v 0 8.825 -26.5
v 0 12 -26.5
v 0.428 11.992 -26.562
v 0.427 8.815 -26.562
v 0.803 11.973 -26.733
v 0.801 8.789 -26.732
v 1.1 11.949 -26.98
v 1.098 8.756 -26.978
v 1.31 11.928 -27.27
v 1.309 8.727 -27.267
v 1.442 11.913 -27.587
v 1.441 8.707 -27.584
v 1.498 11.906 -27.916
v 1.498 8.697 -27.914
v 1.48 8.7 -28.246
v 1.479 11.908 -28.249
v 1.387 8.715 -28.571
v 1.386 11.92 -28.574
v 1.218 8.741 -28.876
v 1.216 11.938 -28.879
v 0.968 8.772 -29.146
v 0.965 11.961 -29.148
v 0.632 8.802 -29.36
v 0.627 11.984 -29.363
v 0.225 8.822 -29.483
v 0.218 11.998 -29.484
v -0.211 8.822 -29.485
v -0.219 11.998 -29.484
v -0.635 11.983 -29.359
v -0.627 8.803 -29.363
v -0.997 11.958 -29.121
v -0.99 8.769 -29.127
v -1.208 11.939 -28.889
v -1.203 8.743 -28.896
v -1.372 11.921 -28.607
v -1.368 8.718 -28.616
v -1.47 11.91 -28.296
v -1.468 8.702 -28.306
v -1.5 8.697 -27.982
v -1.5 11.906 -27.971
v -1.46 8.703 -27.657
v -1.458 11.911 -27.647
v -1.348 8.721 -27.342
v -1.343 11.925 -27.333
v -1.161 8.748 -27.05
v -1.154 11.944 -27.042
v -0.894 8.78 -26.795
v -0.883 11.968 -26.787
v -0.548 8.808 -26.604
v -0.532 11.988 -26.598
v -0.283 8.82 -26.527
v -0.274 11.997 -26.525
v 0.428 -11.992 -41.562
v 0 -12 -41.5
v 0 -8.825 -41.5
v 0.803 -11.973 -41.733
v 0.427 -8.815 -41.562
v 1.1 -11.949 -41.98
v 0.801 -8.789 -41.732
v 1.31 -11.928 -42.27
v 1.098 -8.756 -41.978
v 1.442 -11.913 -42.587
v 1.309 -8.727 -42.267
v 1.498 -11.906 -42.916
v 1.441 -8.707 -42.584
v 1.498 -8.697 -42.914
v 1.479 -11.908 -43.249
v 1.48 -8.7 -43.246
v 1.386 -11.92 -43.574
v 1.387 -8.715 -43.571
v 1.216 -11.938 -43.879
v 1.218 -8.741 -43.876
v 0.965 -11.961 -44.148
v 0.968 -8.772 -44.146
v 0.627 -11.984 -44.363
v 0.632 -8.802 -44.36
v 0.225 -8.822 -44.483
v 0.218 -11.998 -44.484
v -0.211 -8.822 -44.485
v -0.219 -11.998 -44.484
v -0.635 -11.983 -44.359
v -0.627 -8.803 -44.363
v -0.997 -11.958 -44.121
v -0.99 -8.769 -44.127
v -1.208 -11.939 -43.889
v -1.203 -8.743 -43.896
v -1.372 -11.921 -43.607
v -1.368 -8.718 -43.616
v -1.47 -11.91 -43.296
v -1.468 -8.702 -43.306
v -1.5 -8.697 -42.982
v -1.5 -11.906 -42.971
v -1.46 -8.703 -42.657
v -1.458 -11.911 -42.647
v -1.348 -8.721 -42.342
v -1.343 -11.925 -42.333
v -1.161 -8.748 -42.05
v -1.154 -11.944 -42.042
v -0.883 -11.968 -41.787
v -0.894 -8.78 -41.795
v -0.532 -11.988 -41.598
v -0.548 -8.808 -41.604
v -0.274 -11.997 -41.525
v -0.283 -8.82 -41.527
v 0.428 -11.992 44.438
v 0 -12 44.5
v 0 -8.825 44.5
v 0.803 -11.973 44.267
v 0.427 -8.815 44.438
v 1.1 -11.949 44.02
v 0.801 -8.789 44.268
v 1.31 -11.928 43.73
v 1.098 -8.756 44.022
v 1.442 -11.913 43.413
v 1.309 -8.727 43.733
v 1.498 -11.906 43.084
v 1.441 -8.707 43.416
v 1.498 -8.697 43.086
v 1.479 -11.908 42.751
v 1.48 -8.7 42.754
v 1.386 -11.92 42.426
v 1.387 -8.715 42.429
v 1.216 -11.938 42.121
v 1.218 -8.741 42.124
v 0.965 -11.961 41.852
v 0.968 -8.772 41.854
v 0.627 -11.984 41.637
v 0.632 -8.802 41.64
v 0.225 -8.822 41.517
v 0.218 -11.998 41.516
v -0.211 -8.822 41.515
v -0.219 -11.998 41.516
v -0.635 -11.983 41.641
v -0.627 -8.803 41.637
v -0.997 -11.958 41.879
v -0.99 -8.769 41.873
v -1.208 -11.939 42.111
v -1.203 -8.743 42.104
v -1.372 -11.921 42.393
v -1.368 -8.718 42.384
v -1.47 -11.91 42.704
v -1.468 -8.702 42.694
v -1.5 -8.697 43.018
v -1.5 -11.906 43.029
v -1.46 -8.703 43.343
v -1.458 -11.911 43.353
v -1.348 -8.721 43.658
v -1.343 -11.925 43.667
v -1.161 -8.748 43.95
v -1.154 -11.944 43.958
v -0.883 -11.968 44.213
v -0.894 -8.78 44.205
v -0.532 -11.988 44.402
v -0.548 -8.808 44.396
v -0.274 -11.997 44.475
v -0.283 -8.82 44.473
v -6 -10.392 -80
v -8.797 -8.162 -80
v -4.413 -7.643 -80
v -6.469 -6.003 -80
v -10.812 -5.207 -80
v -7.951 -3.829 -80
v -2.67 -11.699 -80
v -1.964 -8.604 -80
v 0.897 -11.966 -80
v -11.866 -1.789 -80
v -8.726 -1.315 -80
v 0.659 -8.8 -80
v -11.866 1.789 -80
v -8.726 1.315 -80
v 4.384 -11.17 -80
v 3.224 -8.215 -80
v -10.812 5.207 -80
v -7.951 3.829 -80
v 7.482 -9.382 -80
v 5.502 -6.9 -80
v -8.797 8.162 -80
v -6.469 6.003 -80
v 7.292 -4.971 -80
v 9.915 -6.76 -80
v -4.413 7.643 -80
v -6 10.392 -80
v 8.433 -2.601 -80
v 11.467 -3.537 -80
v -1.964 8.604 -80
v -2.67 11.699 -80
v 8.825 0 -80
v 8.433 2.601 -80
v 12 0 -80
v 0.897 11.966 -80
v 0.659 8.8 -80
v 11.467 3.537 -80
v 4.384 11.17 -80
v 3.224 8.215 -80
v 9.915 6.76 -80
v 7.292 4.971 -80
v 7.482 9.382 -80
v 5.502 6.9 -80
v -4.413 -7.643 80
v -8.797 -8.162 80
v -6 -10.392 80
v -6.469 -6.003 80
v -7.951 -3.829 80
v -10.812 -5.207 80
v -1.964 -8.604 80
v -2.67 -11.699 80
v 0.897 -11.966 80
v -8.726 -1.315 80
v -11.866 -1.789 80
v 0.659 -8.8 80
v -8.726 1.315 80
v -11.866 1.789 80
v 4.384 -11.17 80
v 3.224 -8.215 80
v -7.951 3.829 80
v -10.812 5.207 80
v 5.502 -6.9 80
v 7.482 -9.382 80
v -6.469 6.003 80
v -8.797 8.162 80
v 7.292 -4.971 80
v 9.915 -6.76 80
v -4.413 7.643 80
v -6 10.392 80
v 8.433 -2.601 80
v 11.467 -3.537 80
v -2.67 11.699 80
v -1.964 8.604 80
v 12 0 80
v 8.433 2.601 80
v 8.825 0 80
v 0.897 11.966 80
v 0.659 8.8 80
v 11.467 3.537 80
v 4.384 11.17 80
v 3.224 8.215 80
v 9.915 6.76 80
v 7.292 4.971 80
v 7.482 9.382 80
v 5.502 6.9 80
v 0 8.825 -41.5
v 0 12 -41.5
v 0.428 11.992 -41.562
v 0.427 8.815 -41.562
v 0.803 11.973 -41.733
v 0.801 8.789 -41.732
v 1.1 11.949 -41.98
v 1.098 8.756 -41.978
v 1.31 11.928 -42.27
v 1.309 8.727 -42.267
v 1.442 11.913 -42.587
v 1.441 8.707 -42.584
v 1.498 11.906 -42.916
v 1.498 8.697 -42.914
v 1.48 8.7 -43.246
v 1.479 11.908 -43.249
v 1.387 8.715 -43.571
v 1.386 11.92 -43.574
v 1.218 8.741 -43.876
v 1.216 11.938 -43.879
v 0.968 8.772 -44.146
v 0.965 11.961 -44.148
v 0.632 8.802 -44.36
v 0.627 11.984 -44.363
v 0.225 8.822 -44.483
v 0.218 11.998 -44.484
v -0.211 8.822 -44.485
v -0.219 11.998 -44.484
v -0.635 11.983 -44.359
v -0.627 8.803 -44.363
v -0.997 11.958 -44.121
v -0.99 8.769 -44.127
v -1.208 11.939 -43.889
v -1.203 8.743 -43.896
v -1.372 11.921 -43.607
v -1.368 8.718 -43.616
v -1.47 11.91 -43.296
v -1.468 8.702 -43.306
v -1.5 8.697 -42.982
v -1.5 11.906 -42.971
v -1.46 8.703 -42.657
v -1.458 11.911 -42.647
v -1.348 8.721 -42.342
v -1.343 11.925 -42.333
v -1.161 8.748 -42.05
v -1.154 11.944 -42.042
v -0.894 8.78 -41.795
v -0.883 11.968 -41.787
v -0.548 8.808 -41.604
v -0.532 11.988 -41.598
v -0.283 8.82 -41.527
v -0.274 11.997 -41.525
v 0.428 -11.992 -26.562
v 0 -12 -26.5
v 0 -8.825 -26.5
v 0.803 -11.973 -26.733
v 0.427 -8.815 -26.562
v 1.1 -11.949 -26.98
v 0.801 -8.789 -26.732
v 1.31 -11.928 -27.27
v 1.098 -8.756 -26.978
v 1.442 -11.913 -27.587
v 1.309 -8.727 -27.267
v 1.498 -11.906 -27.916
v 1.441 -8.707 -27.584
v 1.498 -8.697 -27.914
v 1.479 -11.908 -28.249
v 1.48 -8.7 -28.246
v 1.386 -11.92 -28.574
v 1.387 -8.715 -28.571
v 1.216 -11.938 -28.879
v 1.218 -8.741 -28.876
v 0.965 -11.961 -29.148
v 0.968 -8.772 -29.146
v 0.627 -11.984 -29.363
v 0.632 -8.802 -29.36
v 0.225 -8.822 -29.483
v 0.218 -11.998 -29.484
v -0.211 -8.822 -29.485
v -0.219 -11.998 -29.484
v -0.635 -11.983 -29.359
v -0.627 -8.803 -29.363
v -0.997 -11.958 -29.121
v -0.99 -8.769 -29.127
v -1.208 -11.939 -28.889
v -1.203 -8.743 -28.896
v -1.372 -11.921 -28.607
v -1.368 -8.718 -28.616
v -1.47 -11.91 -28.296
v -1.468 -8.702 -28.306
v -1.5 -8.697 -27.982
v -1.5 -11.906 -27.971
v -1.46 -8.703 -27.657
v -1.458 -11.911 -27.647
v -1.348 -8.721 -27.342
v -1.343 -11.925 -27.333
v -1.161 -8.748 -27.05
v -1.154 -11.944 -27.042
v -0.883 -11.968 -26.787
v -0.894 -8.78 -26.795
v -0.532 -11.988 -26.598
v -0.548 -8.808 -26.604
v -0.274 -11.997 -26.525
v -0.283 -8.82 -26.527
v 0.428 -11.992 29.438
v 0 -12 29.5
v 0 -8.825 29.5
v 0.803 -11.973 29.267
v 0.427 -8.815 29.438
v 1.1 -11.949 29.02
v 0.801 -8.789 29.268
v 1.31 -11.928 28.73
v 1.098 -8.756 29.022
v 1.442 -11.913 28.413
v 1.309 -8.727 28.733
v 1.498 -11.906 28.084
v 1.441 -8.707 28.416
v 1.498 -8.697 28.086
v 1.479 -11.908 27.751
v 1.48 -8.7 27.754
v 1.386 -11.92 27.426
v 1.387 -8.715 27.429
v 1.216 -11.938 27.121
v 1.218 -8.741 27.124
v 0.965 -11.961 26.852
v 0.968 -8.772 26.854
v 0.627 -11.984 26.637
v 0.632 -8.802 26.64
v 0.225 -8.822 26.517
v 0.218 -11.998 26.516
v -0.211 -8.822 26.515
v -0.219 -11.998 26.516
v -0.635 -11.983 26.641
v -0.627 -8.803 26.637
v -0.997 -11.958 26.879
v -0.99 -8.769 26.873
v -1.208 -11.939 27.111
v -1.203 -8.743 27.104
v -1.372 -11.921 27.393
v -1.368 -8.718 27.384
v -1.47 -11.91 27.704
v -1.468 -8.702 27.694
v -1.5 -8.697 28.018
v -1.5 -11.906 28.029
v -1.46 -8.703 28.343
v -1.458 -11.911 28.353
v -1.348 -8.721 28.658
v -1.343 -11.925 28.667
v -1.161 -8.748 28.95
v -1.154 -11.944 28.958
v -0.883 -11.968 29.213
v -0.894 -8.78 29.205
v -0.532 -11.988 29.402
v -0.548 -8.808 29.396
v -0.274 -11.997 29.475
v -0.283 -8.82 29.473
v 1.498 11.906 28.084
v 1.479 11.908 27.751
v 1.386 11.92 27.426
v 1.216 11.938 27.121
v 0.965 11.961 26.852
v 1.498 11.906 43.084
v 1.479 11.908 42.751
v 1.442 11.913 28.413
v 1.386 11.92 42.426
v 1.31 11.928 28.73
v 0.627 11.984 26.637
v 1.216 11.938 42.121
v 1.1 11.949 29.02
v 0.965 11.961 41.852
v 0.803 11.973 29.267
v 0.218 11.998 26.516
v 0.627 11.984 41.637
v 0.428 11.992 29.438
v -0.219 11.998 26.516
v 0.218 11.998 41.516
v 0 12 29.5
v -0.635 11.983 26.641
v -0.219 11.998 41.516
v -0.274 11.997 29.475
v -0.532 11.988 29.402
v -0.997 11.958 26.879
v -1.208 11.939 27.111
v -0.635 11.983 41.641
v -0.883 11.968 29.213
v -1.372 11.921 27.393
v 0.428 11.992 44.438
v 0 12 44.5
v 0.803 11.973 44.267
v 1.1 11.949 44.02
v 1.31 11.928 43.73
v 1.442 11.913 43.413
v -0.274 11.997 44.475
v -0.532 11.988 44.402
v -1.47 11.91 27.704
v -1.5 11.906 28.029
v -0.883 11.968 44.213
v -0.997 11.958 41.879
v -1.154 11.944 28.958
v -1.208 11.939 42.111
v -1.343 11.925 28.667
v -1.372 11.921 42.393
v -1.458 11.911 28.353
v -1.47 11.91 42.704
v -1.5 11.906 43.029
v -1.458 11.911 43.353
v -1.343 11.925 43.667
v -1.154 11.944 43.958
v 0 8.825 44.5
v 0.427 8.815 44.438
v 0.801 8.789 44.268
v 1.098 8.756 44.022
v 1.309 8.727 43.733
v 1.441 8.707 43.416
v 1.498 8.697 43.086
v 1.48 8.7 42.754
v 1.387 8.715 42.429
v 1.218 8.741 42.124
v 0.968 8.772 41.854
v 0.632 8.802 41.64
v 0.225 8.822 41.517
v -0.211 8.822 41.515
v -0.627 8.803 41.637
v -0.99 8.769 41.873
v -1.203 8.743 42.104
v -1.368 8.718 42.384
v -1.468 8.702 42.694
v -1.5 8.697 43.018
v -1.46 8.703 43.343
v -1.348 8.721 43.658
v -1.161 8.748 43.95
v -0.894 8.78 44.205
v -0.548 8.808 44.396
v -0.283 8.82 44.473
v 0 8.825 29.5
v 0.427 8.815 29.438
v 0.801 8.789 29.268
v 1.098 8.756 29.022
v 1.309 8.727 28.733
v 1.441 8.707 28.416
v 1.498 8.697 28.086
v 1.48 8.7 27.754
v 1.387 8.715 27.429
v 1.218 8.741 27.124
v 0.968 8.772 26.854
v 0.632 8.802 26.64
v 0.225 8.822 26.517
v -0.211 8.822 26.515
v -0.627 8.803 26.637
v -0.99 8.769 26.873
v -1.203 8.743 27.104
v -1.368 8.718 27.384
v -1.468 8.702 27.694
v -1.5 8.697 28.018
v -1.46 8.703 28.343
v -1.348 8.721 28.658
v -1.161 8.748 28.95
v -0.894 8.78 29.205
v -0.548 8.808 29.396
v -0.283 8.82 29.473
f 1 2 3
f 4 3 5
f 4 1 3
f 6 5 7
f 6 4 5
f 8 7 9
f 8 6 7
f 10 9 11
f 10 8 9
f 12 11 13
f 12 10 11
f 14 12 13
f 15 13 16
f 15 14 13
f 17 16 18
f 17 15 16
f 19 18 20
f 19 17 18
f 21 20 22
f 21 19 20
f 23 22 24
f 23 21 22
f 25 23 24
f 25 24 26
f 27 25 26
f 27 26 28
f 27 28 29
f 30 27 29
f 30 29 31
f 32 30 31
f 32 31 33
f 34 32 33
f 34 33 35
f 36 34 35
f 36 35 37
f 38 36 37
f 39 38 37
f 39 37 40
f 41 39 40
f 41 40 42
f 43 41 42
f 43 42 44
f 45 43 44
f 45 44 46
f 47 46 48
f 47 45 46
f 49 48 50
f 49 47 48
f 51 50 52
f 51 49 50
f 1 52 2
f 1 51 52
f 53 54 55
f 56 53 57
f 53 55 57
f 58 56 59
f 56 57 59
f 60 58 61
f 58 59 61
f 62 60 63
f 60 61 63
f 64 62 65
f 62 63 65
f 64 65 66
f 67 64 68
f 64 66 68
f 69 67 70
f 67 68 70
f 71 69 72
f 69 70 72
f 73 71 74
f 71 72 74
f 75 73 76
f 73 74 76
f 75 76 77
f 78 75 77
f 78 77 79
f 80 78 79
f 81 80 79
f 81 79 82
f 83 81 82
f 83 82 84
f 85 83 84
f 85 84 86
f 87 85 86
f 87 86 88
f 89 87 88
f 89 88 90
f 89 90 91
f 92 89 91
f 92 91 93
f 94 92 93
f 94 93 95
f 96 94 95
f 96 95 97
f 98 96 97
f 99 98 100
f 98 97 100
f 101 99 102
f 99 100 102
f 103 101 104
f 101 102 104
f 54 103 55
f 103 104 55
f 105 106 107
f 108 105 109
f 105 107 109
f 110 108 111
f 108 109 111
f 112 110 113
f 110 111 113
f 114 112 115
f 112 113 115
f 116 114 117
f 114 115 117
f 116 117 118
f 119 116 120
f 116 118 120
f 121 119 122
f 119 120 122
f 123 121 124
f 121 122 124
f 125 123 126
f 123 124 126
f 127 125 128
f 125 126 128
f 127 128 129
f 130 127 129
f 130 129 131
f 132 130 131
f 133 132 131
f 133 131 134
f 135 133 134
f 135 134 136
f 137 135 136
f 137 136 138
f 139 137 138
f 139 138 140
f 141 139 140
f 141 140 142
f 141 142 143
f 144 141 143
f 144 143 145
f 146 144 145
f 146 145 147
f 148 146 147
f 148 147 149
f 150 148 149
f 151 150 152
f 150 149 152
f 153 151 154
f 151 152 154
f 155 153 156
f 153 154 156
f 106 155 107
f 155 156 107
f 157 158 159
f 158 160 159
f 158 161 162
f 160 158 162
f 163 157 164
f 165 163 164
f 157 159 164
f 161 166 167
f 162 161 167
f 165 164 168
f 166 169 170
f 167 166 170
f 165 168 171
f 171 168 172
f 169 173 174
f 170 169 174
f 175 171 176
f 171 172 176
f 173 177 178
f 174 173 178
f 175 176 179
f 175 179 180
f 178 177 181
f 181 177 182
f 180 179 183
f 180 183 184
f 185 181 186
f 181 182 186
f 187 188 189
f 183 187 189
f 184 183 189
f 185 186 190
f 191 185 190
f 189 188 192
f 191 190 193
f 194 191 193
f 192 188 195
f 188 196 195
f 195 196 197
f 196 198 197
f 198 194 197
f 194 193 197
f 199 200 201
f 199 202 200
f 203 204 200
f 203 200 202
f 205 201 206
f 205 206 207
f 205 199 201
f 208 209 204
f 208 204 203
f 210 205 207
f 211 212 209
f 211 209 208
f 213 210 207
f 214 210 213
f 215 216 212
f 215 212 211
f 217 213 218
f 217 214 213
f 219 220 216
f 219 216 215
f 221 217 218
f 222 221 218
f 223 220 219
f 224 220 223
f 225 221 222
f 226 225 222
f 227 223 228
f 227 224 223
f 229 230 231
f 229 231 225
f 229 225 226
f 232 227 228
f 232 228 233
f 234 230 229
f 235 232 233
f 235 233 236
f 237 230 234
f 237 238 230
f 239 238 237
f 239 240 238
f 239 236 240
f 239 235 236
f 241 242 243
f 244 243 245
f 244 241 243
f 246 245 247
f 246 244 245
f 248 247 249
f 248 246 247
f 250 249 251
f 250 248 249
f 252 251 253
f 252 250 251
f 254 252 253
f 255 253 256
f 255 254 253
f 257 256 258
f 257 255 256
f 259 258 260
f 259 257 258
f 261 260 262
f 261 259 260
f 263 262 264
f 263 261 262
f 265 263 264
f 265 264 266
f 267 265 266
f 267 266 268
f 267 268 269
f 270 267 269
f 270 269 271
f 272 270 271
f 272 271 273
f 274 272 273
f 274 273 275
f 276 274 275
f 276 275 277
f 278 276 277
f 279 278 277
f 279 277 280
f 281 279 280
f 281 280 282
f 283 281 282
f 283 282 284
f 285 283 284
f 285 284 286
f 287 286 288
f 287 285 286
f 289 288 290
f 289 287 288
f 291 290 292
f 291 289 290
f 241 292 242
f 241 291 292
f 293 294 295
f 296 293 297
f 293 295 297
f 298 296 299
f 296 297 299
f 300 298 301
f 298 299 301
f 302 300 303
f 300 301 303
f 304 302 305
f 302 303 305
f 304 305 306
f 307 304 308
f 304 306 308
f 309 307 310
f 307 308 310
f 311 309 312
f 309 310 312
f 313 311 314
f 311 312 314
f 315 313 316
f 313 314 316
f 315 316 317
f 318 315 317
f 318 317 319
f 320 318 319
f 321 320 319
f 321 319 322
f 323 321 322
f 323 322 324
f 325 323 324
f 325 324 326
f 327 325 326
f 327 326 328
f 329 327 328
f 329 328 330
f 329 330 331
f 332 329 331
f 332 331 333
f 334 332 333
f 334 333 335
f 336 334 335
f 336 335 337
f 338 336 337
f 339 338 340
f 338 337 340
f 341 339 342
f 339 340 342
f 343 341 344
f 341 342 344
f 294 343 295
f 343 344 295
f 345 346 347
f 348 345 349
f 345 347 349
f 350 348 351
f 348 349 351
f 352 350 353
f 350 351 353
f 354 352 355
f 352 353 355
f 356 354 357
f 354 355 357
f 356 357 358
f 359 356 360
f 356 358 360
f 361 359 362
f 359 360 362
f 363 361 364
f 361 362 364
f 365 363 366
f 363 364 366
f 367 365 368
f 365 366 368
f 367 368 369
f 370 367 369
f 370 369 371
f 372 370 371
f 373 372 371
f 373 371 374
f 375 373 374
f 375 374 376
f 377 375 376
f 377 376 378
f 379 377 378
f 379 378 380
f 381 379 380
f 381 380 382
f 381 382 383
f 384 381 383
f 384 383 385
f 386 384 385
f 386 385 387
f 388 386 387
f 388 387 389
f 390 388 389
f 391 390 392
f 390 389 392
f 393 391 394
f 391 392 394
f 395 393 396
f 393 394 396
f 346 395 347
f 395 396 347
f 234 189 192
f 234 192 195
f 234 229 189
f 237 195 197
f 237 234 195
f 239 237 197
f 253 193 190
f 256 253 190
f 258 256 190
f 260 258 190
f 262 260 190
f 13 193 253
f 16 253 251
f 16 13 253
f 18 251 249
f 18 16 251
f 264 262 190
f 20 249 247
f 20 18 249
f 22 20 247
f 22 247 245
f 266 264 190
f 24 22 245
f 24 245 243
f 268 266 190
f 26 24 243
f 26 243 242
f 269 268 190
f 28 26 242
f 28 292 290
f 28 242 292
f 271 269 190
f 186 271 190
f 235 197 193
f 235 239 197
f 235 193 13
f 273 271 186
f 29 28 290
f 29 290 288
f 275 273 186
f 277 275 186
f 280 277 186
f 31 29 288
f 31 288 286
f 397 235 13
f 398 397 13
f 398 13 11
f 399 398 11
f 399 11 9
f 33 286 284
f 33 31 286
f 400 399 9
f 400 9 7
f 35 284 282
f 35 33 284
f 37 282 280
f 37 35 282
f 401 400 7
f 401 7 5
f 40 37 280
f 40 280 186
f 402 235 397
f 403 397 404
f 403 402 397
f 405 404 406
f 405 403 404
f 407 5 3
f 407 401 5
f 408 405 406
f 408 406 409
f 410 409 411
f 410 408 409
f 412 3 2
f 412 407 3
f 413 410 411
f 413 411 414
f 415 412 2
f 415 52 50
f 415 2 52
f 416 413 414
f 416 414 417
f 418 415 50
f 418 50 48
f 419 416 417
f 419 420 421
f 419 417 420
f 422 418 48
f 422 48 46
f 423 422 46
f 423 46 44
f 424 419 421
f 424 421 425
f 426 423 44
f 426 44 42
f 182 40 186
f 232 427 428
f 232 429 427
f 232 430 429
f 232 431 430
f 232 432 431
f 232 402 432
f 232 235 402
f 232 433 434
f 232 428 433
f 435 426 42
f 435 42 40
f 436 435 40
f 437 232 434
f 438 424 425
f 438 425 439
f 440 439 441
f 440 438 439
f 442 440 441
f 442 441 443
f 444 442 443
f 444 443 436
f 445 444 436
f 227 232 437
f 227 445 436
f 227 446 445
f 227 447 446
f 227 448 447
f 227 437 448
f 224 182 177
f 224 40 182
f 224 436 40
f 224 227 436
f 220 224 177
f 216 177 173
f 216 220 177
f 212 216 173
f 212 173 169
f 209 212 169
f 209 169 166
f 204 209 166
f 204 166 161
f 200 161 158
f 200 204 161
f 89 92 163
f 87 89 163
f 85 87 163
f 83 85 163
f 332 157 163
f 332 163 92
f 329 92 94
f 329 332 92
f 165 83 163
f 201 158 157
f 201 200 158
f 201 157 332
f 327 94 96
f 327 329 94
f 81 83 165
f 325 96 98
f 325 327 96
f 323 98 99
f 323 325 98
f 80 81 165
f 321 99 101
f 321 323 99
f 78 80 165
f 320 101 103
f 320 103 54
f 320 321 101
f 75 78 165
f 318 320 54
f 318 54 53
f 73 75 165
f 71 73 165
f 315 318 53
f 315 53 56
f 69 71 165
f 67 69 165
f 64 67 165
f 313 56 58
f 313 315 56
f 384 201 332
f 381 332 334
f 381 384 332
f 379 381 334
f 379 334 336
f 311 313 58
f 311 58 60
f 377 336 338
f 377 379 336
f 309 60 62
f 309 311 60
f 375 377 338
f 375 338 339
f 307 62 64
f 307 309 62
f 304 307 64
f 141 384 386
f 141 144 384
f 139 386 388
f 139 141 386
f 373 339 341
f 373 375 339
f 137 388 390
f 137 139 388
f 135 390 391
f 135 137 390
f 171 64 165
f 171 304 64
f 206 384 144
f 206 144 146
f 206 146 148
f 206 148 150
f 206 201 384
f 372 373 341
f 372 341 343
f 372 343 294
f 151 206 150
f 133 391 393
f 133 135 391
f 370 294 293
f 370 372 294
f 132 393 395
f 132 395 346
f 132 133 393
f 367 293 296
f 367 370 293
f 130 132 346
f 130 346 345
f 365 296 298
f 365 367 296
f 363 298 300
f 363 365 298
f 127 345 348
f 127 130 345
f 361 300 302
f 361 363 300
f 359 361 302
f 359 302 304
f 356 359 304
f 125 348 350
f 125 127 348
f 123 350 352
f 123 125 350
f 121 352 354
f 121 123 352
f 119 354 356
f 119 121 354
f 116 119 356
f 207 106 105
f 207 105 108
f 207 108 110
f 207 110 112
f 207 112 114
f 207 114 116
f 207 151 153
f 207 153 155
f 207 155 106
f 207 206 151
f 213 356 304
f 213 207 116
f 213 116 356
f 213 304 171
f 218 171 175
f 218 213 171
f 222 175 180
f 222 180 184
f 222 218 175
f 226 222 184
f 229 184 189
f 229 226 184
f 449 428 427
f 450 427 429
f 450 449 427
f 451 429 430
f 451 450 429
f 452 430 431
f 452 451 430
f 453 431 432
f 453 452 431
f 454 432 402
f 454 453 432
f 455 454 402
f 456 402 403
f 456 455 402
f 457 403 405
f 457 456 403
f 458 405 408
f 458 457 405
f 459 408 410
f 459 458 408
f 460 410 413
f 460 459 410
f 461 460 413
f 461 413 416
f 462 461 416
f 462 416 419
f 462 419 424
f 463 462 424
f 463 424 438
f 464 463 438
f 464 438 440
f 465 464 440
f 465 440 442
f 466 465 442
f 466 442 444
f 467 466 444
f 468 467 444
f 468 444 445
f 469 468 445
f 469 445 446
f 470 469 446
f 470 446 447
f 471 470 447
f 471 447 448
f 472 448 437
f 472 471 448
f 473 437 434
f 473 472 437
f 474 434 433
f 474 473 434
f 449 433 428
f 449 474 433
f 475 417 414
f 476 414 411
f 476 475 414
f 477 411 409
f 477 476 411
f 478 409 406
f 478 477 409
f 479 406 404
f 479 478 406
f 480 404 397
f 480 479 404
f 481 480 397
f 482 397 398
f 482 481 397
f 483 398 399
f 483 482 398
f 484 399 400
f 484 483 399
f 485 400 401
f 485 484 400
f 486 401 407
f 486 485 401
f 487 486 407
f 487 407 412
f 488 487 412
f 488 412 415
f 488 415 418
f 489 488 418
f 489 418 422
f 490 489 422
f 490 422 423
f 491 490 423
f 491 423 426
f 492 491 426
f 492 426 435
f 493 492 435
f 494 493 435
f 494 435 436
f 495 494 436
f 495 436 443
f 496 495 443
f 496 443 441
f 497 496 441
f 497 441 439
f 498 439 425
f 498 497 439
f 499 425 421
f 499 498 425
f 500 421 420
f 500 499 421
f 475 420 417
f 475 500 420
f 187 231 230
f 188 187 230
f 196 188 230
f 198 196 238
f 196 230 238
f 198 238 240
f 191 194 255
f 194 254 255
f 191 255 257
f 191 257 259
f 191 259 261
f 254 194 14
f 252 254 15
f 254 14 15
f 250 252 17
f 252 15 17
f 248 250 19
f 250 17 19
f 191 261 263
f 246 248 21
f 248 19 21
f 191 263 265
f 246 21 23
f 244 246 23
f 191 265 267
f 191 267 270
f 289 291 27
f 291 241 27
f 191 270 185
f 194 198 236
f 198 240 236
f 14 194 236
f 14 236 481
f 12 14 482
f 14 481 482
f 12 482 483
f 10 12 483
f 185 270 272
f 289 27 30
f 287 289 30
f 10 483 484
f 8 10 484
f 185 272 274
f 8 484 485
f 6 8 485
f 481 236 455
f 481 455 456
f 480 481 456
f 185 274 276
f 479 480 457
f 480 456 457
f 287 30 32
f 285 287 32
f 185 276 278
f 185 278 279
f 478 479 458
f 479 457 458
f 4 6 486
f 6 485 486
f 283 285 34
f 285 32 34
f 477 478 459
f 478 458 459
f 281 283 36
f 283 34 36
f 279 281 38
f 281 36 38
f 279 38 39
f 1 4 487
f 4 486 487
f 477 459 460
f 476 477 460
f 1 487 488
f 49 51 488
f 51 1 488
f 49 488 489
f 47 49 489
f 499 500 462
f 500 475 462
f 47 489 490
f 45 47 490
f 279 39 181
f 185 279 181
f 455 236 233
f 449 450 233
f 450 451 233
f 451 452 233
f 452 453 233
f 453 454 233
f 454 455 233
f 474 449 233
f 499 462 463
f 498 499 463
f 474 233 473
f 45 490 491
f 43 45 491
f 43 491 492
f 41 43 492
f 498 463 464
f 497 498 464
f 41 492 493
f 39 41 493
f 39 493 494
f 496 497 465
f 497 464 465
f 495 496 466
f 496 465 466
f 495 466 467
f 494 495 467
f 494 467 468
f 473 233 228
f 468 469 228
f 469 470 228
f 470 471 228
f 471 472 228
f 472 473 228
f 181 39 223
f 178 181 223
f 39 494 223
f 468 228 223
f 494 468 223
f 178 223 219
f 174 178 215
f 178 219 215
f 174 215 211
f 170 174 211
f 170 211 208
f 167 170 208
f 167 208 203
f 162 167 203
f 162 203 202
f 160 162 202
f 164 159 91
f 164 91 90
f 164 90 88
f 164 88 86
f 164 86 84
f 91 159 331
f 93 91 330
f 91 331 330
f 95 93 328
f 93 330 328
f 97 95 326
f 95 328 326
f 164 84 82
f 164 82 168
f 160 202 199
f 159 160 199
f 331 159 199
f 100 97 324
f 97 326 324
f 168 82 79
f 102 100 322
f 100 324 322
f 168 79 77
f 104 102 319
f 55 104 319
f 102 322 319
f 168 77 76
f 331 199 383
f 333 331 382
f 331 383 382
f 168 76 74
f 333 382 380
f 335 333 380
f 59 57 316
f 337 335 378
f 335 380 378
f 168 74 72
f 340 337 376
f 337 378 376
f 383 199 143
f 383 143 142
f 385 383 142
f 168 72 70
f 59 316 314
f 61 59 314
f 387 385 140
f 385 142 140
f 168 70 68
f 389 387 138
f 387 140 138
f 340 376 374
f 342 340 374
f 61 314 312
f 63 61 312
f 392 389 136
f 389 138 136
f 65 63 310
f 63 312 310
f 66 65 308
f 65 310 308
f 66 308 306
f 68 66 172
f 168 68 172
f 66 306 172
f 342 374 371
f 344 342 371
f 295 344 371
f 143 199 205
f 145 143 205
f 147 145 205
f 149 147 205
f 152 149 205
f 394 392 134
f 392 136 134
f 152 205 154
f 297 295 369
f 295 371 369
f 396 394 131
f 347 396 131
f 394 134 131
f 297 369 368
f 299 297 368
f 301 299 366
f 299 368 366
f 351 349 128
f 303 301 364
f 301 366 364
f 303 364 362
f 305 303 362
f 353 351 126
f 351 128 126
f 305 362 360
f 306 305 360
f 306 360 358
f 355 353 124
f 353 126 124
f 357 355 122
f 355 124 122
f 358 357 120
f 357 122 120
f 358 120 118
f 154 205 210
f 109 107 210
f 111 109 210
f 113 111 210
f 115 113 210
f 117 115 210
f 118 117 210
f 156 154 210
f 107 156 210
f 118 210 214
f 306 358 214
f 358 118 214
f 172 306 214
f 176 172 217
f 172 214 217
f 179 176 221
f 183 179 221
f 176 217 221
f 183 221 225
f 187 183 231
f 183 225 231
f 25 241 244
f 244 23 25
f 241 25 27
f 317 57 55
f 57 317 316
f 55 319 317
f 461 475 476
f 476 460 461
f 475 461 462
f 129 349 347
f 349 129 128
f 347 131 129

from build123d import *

# Parameters (mm, degrees)
SKETCH1_R               = 12
BOSS_EXTRUDE1_DEPTH     = 80
SHELL1_T                = -3.175
SKETCH3_R               = 1.5
CUT_EXTRUDE1_DEPTH      = 82.780193201
CUT_EXTRUDE1_DEPTH_BACK = 82.780193201


with BuildPart() as part:
    # Sketch1 → Boss-Extrude1 (new, symmetric)
    with BuildSketch(Plane.XY):
        Circle(SKETCH1_R)
    extrude(amount=BOSS_EXTRUDE1_DEPTH, both=True)

    # Shell1
    shell1_openings = [part.faces().sort_by_distance(p)[0] for p in [
        (0, 0, 80),
        (0, 0, -80),
    ]]
    offset(amount=SHELL1_T, openings=shell1_openings, kind=Kind.INTERSECTION)

    # Sketch3 → Cut-Extrude1 (cut, two sides)
    with BuildSketch(Plane(origin=(0, 0, 0), x_dir=(1, 0, 0), z_dir=(0, 1, 0))) as cut_extrude1_sk:
        with Locations(Location((0, 28, 0), (0, 0, 270))):
            Circle(SKETCH3_R)
        with Locations(Location((0, -28, 0), (0, 0, 270))):
            Circle(SKETCH3_R)
        with Locations(Location((0, -43, 0), (0, 0, 270))):
            Circle(SKETCH3_R)
        with Locations(Location((0, 43, 0), (0, 0, 270))):
            Circle(SKETCH3_R)
    extrude(amount=CUT_EXTRUDE1_DEPTH, mode=Mode.SUBTRACT)
    extrude(cut_extrude1_sk.sketch, amount=-CUT_EXTRUDE1_DEPTH_BACK, mode=Mode.SUBTRACT)


solid = part.part
